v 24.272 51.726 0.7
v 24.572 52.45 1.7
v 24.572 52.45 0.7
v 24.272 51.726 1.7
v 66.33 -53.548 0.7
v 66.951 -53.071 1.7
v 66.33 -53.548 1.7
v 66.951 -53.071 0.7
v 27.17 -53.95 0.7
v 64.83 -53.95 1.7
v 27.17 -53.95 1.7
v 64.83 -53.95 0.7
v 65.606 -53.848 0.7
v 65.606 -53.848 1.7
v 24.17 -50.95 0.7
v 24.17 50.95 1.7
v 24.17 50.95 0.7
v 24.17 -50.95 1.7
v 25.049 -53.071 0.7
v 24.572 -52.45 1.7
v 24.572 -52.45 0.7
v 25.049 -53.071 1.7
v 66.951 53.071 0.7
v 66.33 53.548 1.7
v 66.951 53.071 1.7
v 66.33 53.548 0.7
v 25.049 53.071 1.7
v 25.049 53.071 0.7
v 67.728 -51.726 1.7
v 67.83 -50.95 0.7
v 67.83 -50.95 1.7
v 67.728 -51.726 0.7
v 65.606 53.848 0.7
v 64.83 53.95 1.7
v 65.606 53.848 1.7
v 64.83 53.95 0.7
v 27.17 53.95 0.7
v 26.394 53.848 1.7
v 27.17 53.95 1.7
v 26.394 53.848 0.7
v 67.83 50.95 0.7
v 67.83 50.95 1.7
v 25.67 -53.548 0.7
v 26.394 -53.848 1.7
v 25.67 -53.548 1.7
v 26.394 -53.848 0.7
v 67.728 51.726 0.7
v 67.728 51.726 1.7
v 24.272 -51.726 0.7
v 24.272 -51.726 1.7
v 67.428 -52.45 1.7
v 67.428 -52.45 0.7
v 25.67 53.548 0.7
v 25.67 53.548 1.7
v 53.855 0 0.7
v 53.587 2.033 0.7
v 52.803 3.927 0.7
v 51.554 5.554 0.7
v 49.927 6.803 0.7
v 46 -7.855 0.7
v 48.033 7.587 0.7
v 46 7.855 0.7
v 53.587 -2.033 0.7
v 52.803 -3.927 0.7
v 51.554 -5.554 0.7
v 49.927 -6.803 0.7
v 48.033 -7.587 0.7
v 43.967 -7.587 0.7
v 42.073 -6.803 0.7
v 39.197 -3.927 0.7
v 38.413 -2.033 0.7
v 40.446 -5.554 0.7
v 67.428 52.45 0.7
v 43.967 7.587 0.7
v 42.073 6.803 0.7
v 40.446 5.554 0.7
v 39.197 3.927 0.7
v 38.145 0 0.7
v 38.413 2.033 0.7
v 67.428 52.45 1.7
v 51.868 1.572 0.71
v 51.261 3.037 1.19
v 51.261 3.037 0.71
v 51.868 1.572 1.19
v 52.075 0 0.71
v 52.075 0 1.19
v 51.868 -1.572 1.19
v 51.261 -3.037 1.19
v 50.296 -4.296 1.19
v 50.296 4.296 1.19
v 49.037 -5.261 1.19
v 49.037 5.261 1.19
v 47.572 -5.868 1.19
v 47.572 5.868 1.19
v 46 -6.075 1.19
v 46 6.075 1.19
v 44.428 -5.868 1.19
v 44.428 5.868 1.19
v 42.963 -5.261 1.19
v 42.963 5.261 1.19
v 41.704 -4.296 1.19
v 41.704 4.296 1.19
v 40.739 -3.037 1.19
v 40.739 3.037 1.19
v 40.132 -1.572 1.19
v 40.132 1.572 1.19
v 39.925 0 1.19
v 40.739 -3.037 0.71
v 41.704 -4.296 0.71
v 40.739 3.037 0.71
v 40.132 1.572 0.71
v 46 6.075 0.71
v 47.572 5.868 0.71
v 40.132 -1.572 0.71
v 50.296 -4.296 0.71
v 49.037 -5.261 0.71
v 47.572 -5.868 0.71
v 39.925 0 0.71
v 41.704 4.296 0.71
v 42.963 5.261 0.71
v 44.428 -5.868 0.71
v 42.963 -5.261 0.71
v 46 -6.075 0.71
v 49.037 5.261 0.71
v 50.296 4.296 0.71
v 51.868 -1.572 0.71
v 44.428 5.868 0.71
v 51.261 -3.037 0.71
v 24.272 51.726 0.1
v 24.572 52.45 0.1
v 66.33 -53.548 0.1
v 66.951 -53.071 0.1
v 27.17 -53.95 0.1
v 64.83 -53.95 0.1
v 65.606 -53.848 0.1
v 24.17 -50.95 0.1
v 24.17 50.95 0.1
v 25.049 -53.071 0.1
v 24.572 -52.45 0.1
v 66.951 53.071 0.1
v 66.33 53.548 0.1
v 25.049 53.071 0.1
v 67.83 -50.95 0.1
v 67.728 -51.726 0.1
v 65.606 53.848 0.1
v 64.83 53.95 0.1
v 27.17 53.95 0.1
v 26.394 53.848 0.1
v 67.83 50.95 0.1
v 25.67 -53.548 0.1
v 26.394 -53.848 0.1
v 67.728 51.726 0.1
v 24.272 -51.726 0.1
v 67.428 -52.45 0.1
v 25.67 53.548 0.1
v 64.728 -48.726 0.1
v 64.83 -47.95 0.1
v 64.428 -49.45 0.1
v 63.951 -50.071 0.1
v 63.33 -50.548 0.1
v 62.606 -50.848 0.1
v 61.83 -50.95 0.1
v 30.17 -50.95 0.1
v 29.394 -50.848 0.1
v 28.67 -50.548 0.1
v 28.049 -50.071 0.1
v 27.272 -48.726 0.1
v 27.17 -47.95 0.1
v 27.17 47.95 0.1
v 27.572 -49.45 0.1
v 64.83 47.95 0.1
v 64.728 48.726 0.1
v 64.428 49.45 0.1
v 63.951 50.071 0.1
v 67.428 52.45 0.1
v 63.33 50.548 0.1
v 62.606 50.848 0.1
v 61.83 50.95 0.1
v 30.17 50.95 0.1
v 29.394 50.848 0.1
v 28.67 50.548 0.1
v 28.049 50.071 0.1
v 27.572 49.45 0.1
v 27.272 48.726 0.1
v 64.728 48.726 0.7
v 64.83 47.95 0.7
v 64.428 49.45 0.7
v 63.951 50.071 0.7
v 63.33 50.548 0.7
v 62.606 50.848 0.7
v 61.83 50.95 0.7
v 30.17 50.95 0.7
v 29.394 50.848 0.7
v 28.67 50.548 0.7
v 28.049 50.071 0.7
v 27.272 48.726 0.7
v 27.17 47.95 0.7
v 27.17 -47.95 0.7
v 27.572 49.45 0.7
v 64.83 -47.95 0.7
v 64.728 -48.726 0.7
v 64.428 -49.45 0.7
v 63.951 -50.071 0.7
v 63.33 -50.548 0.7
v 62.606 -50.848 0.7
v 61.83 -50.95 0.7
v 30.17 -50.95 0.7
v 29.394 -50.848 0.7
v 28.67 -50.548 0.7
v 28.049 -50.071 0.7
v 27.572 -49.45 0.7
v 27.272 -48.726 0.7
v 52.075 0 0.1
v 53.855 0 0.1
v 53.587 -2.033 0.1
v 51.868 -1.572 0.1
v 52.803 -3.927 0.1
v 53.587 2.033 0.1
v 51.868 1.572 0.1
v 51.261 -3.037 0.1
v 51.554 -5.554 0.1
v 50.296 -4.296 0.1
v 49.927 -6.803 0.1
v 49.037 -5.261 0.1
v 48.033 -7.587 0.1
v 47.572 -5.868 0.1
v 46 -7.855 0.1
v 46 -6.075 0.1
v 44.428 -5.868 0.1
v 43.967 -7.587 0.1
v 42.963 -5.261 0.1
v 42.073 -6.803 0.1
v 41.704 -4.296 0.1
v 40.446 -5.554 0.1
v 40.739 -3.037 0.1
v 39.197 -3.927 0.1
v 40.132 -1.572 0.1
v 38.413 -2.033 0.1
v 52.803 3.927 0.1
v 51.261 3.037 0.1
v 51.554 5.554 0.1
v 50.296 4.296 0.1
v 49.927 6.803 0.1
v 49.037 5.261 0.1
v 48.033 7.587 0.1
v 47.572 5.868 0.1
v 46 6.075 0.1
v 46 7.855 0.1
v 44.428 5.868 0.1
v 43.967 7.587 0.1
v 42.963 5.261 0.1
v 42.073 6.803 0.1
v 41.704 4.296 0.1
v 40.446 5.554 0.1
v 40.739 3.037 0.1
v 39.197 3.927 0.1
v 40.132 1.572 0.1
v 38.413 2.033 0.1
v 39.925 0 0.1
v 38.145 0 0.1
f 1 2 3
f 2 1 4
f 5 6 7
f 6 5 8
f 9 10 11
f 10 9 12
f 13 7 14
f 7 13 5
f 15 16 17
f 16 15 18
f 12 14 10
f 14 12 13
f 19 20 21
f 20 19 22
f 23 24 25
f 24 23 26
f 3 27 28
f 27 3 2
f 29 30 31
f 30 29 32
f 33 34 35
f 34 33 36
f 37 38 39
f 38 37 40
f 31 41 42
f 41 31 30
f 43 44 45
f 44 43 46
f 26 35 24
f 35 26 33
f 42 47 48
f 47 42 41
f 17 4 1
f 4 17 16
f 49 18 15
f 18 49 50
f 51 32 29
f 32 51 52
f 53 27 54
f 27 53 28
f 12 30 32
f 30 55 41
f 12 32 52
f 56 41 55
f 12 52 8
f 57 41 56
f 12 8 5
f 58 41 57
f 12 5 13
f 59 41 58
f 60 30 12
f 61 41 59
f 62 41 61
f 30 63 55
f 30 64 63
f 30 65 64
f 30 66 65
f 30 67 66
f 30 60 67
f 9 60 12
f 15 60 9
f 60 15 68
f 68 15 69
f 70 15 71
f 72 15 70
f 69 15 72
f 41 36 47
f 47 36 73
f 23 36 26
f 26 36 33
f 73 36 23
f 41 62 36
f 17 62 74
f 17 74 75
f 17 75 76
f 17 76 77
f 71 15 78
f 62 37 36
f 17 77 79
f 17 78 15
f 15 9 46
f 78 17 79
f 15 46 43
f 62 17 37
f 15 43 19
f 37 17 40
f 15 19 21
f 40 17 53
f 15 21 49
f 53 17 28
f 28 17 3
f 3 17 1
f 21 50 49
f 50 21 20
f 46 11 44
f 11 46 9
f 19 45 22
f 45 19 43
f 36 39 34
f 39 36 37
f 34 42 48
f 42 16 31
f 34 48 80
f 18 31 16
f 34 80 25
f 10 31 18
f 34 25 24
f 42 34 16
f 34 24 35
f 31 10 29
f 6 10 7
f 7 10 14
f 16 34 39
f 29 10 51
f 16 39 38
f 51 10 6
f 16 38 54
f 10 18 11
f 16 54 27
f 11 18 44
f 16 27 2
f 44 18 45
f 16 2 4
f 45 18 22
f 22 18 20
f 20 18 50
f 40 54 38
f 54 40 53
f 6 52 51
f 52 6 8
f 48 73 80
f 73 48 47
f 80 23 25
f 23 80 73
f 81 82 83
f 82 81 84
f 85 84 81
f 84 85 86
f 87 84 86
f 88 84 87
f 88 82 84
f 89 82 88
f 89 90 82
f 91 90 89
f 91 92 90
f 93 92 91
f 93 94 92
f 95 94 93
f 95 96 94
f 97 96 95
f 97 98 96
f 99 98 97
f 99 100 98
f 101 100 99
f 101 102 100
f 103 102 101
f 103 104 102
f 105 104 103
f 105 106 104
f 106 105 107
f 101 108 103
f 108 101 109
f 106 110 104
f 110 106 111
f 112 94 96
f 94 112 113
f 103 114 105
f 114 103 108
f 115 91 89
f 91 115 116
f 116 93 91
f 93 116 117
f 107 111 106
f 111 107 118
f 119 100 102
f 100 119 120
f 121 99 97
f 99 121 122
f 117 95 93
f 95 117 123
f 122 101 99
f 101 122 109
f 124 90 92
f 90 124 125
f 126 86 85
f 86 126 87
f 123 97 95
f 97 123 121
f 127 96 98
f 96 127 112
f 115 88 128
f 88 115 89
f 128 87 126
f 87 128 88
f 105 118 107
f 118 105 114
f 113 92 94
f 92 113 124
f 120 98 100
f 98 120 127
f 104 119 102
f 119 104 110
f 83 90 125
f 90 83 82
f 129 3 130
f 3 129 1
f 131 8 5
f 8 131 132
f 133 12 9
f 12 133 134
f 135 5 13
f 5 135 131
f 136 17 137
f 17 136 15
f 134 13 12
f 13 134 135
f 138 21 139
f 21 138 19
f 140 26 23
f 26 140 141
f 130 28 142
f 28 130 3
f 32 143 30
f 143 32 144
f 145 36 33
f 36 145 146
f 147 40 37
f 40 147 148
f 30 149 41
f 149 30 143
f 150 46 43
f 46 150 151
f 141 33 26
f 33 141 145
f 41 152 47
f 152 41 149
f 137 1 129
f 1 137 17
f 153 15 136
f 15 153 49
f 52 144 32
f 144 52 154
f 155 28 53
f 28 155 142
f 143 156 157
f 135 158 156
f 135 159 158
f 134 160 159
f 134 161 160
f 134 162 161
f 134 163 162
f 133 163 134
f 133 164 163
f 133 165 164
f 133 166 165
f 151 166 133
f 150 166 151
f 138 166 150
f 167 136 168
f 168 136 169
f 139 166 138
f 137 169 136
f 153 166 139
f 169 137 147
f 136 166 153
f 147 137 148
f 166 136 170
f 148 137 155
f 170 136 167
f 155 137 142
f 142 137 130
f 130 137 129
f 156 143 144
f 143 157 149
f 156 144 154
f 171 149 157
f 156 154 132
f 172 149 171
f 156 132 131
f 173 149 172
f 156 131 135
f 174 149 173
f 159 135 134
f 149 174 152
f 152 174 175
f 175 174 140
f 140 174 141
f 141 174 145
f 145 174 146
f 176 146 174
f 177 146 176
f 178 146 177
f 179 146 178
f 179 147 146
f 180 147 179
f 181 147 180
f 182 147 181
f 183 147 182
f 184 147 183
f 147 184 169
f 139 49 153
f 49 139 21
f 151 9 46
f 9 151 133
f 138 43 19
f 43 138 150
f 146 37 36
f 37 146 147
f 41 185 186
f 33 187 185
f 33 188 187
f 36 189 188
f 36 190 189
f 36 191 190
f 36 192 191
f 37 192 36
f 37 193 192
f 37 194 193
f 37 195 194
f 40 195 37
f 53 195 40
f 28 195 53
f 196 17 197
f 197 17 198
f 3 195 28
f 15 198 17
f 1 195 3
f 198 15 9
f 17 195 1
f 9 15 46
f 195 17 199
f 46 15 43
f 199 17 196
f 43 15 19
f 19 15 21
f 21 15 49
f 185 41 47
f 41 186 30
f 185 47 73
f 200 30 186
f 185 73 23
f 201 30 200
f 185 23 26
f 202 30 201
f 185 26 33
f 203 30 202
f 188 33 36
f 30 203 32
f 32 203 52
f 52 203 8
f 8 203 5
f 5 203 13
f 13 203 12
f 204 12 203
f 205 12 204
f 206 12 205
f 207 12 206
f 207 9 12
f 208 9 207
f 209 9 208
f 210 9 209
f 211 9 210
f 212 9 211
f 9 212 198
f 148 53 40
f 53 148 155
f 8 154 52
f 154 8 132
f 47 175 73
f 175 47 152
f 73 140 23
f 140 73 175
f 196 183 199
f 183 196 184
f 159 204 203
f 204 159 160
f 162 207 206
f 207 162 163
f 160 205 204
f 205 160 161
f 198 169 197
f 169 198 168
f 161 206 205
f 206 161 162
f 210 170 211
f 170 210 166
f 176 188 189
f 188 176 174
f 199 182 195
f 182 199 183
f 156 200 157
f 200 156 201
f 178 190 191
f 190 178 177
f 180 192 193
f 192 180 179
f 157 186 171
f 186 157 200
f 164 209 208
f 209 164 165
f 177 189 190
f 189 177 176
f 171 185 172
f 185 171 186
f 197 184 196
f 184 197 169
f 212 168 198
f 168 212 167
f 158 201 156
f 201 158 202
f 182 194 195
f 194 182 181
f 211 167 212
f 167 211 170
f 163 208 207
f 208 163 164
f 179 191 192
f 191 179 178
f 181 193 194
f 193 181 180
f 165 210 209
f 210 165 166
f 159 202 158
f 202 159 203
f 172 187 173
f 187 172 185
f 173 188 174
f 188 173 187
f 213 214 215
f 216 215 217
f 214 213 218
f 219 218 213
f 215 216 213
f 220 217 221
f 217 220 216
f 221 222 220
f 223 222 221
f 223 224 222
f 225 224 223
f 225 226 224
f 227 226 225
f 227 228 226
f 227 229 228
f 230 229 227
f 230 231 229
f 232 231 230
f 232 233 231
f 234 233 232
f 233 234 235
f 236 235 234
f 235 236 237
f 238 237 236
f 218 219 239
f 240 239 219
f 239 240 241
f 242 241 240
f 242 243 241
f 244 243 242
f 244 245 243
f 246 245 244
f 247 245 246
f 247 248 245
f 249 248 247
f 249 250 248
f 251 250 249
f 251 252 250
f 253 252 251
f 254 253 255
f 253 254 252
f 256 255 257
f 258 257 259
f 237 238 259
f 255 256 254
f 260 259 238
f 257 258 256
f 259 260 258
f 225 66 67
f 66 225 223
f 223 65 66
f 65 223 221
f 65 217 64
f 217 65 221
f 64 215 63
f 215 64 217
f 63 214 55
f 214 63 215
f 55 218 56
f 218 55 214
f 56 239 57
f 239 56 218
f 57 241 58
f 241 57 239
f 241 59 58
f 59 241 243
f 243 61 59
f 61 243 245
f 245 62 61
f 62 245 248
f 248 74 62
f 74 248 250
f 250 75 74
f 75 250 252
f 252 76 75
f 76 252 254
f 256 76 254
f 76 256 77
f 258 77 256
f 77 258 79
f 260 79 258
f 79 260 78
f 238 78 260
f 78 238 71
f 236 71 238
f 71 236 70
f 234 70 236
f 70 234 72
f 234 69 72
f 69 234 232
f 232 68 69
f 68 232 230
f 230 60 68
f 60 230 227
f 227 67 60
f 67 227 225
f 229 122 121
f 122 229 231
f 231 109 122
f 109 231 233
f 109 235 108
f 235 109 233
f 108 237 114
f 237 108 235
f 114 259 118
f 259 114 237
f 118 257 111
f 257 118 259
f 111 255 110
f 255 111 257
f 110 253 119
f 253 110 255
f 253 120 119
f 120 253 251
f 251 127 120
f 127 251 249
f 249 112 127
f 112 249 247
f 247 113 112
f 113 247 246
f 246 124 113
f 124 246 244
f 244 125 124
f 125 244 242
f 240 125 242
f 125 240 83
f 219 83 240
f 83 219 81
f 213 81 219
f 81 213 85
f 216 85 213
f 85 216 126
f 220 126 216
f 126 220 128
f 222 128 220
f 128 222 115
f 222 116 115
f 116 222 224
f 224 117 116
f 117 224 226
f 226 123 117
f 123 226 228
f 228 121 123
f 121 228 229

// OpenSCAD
// file: ../../third_party/fillets/fillets2d.scad
/*
Modified by Kevin Gravier
https://www.thingiverse.com/mrkmg/about

Originally from: https://github.com/OskarLinde/scad-utils/blob/master/morphology.scad



Modules:

rounding2d(r)
r = radius of rounding

fillet2d(r)
r = radius of rounding

*/

$fa = 0.1;
$fs = 0.1;

// Example
linear_extrude(1)
rounding2d(1)
fillet2d(1)
difference() {
    union() {
        square([10, 10], center = true);
        translate([5, 5])
        square([10, 10], center = true);
    }
    
    translate([-5, -5])
    square([10, 10], center = true);
    
    translate([8, 8])
    circle(3);
}

// Example, text
translate([-20, -15])
rotate([0, 0, 0])
linear_extrude(1)
rounding2d(.25)
fillet2d(.25)
text("Fillets!");

module fillet2d(r) {
    offset(r = -r) offset(delta = r) children(0);
}

module rounding2d(r) {
    offset(r = r) offset(delta = -r) children(0);
}
// main file
use <../../third_party/fillets/fillets2d.scad>

$fn = 24;
screw_hole = 3.7;
screw_head_width = 6.66;
screw_head_tolerance = 0.2;
screw_angle = 41;
screw_chamfer_0 = [0, (screw_head_width + screw_head_tolerance) / tan(screw_angle)];
screw_chamfer_1 = [(screw_head_width + screw_head_tolerance) / 2, 0];

/*
// Skinny remote
remote_x = 30;
remote_y = 92;
remote_z = 9.6;
*/
remote_x = 41.96;
remote_y = 91.96;
remote_z = 10.5;

remote_fillet = 3;
remote_hole_z = 3.5;
remote_gap = 0.3;

remote_back_x_margin = .85;
remote_back_fillet = 3;
remote_back_wall_height = 1;
remote_back_gap = 0.2;
remote_back_to_wall_gap = 0.1;
magnet_diameter = 12;
magnet_height = 1.1;
magnet_gap = 0.15;
magnet_back_indent = 0.5;

switch_x = 33.2;
switch_y = 66.8;
switch_fillet = 2;

plate_base_width = 69.8;
switch_spacing = 46;
plate_y = 114.3;
plate_y_wall = 3;

plate_height = 5.2;

assert(plate_height > remote_hole_z + remote_back_wall_height + remote_back_to_wall_gap + 0.2);
assert(plate_height > remote_hole_z + remote_back_wall_height - magnet_back_indent + magnet_height + remote_back_to_wall_gap);

module gang_base(num_gangs) {
    translate([-switch_spacing / 2 * (num_gangs - 1), 0]) children();
}

module for_gangs(num_gangs) {
    gang_base(num_gangs) {
        for (n = [0:num_gangs-1]) {
            translate([n * switch_spacing, 0]) {
                children();
            }
        }
    }
}

module faceplate(fillet, num_gangs = 1) {
    difference() {
        // Main extrusion
        linear_extrude(height = plate_height) {
            difference() {
                rounding2d(fillet) {
                    square([plate_base_width + (num_gangs - 1) * switch_spacing, plate_y], true);
                }
            }
        }
    }
}

module screw_holes(num_gangs, n) {
    gang_base(num_gangs) {
        translate([n * switch_spacing, 0]) {
            for (y = [-96.8 / 2, 96.8 / 2]) {
                translate([0, y, plate_height + .01]) {
                    rotate([0, 180, 0]) {
                        // Hole
                        rotate_extrude() {
                            polygon([[0, 0], [screw_hole / 2, 0], [screw_hole / 2, plate_height + .02], [0, plate_height + .02]]);
                        }
                        // Chamfer
                        rotate_extrude() {
                            polygon([[0, 0], screw_chamfer_0, screw_chamfer_1]);
                        }
                    }
                }
            }
        }
    }
}

module switch_hole(num_gangs, n, fillet_back_left = false, fillet_back_right = false) {
    gang_base(num_gangs) {
        translate([n * switch_spacing, 0]) {
            // Through-hole
            translate([0, 0, -.5]) {
                linear_extrude(height = 6 + 1) {
                    rounding2d  (switch_fillet) {
                        square([switch_x, switch_y], center = true);
                    }
                }
            }
            // Recess for mounting tabs
            translate([0, 0, -1]) {
              linear_extrude(height = (plate_height - 2.4) + 1) {
                rounding2d(5) {
                  square([switch_spacing + .01, plate_y - plate_y_wall * 2], center = true);
                }
                if (!fillet_back_left) {
                  translate([-switch_spacing / 4, 0]) {
                    square([switch_spacing / 2 + .01, plate_y - plate_y_wall * 2], center = true);
                  }
                }
                if (!fillet_back_right) {
                  translate([switch_spacing / 4, 0]) {
                    square([switch_spacing / 2 + .01, plate_y - plate_y_wall * 2], center = true);
                  }
                }
              }
            }
        }
    }
}

module remote() {
  linear_extrude(height = plate_height + .01) {
      rounding2d(switch_fillet) {
          square([remote_x + remote_gap * 2, remote_y + remote_gap * 2], center = true);
    }
  }
}

module remote_hole(num_gangs, n) {
  gang_base(num_gangs) {
    translate([n * switch_spacing, 0, plate_height - remote_hole_z]) {
      remote();

      translate([-1, -1, remote_hole_z - 2.5]) {
        multmatrix(m = [ [1, 0, 1, 1], 
                         [0, 1, 1, 1],
                         [0, 0, 1, 1] ]) {
          remote();
        }
        multmatrix(m = [ [1, 0, -1, 1], 
                         [0, 1, 1, 1],
                         [0, 0, 1, 1] ]) {
          remote();
        }
        multmatrix(m = [ [1, 0, -1, 1], 
                         [0, 1, -1, 1],
                         [0, 0, 1, 1] ]) {
          remote();
        }
        multmatrix(m = [ [1, 0, 1, 1], 
                         [0, 1, -1, 1],
                         [0, 0, 1, 1] ]) {
          remote();
        }
      }

      // Back piece hole
      translate([0, 0, -(plate_height - remote_hole_z) - 1]) {
        linear_extrude(plate_height - remote_hole_z + 1.1) {
          rounding2d(remote_back_fillet) {
            square([remote_x + (remote_back_x_margin + remote_back_gap) * 2, plate_y - plate_y_wall * 2], center = true);
          }
        }
      }
    }
  }
}

module remote_back(num_gangs, n) {
  color("red") {
  gang_base(num_gangs) {
    translate([n * switch_spacing, 0, 0]) {
      // Back wall
      translate([0, 0, plate_height - remote_hole_z - remote_back_wall_height]) {
        difference() {
          linear_extrude(remote_back_wall_height) {
            rounding2d(remote_back_fillet) {
              square([remote_x + remote_back_x_margin * 2, plate_y - (plate_y_wall + remote_back_gap) * 2], center = true);
            }
          }
          translate([0, 0, -0.01]) {
            linear_extrude(0.5) {
              // TODO: should this be magnet_gap * 2 ?
              circle(d = magnet_diameter + magnet_gap);
            }
          }
        }
      }
      difference() {
        // Back plate
        translate([0, 0, remote_back_to_wall_gap]) {
          linear_extrude(plate_height - remote_hole_z - remote_back_wall_height - remote_back_to_wall_gap) {
            rounding2d(remote_back_fillet) {
              square([remote_x + remote_back_x_margin * 2, plate_y - (plate_y_wall + remote_back_gap) * 2], center = true);
            }
          }
        }
        // Wall for back plate
        linear_extrude(plate_height - remote_hole_z - remote_back_wall_height + .01) {
          rounding2d(remote_back_fillet) {
            square([remote_x + remote_back_x_margin * 2 - 6, plate_y - (plate_y_wall + remote_back_gap) * 2 - 6], center = true);
          }
        }
      }
      // Ring for magnet
      translate([0, 0, plate_height - remote_hole_z - remote_back_wall_height - (magnet_height - magnet_back_indent)]) {
        linear_extrude(magnet_height - magnet_back_indent + 0.01) {
          difference() {
            circle(d = magnet_diameter + magnet_gap + 1.78 * 2);
            circle(d = magnet_diameter + magnet_gap);
          }
        }
      }
    }
  }
  }
}

num_gangs = 3;
module plate() {
  difference() {
      faceplate(fillet = 5, num_gangs = num_gangs);
      switch_hole(num_gangs, 0, fillet_back_left = true);
      switch_hole(num_gangs, 1, fillet_back_right = true);
      
      screw_holes(num_gangs, 0);
      screw_holes(num_gangs, 1);

      remote_hole(num_gangs, 2);
  }
}

//plate();
remote_back(num_gangs, 2);
